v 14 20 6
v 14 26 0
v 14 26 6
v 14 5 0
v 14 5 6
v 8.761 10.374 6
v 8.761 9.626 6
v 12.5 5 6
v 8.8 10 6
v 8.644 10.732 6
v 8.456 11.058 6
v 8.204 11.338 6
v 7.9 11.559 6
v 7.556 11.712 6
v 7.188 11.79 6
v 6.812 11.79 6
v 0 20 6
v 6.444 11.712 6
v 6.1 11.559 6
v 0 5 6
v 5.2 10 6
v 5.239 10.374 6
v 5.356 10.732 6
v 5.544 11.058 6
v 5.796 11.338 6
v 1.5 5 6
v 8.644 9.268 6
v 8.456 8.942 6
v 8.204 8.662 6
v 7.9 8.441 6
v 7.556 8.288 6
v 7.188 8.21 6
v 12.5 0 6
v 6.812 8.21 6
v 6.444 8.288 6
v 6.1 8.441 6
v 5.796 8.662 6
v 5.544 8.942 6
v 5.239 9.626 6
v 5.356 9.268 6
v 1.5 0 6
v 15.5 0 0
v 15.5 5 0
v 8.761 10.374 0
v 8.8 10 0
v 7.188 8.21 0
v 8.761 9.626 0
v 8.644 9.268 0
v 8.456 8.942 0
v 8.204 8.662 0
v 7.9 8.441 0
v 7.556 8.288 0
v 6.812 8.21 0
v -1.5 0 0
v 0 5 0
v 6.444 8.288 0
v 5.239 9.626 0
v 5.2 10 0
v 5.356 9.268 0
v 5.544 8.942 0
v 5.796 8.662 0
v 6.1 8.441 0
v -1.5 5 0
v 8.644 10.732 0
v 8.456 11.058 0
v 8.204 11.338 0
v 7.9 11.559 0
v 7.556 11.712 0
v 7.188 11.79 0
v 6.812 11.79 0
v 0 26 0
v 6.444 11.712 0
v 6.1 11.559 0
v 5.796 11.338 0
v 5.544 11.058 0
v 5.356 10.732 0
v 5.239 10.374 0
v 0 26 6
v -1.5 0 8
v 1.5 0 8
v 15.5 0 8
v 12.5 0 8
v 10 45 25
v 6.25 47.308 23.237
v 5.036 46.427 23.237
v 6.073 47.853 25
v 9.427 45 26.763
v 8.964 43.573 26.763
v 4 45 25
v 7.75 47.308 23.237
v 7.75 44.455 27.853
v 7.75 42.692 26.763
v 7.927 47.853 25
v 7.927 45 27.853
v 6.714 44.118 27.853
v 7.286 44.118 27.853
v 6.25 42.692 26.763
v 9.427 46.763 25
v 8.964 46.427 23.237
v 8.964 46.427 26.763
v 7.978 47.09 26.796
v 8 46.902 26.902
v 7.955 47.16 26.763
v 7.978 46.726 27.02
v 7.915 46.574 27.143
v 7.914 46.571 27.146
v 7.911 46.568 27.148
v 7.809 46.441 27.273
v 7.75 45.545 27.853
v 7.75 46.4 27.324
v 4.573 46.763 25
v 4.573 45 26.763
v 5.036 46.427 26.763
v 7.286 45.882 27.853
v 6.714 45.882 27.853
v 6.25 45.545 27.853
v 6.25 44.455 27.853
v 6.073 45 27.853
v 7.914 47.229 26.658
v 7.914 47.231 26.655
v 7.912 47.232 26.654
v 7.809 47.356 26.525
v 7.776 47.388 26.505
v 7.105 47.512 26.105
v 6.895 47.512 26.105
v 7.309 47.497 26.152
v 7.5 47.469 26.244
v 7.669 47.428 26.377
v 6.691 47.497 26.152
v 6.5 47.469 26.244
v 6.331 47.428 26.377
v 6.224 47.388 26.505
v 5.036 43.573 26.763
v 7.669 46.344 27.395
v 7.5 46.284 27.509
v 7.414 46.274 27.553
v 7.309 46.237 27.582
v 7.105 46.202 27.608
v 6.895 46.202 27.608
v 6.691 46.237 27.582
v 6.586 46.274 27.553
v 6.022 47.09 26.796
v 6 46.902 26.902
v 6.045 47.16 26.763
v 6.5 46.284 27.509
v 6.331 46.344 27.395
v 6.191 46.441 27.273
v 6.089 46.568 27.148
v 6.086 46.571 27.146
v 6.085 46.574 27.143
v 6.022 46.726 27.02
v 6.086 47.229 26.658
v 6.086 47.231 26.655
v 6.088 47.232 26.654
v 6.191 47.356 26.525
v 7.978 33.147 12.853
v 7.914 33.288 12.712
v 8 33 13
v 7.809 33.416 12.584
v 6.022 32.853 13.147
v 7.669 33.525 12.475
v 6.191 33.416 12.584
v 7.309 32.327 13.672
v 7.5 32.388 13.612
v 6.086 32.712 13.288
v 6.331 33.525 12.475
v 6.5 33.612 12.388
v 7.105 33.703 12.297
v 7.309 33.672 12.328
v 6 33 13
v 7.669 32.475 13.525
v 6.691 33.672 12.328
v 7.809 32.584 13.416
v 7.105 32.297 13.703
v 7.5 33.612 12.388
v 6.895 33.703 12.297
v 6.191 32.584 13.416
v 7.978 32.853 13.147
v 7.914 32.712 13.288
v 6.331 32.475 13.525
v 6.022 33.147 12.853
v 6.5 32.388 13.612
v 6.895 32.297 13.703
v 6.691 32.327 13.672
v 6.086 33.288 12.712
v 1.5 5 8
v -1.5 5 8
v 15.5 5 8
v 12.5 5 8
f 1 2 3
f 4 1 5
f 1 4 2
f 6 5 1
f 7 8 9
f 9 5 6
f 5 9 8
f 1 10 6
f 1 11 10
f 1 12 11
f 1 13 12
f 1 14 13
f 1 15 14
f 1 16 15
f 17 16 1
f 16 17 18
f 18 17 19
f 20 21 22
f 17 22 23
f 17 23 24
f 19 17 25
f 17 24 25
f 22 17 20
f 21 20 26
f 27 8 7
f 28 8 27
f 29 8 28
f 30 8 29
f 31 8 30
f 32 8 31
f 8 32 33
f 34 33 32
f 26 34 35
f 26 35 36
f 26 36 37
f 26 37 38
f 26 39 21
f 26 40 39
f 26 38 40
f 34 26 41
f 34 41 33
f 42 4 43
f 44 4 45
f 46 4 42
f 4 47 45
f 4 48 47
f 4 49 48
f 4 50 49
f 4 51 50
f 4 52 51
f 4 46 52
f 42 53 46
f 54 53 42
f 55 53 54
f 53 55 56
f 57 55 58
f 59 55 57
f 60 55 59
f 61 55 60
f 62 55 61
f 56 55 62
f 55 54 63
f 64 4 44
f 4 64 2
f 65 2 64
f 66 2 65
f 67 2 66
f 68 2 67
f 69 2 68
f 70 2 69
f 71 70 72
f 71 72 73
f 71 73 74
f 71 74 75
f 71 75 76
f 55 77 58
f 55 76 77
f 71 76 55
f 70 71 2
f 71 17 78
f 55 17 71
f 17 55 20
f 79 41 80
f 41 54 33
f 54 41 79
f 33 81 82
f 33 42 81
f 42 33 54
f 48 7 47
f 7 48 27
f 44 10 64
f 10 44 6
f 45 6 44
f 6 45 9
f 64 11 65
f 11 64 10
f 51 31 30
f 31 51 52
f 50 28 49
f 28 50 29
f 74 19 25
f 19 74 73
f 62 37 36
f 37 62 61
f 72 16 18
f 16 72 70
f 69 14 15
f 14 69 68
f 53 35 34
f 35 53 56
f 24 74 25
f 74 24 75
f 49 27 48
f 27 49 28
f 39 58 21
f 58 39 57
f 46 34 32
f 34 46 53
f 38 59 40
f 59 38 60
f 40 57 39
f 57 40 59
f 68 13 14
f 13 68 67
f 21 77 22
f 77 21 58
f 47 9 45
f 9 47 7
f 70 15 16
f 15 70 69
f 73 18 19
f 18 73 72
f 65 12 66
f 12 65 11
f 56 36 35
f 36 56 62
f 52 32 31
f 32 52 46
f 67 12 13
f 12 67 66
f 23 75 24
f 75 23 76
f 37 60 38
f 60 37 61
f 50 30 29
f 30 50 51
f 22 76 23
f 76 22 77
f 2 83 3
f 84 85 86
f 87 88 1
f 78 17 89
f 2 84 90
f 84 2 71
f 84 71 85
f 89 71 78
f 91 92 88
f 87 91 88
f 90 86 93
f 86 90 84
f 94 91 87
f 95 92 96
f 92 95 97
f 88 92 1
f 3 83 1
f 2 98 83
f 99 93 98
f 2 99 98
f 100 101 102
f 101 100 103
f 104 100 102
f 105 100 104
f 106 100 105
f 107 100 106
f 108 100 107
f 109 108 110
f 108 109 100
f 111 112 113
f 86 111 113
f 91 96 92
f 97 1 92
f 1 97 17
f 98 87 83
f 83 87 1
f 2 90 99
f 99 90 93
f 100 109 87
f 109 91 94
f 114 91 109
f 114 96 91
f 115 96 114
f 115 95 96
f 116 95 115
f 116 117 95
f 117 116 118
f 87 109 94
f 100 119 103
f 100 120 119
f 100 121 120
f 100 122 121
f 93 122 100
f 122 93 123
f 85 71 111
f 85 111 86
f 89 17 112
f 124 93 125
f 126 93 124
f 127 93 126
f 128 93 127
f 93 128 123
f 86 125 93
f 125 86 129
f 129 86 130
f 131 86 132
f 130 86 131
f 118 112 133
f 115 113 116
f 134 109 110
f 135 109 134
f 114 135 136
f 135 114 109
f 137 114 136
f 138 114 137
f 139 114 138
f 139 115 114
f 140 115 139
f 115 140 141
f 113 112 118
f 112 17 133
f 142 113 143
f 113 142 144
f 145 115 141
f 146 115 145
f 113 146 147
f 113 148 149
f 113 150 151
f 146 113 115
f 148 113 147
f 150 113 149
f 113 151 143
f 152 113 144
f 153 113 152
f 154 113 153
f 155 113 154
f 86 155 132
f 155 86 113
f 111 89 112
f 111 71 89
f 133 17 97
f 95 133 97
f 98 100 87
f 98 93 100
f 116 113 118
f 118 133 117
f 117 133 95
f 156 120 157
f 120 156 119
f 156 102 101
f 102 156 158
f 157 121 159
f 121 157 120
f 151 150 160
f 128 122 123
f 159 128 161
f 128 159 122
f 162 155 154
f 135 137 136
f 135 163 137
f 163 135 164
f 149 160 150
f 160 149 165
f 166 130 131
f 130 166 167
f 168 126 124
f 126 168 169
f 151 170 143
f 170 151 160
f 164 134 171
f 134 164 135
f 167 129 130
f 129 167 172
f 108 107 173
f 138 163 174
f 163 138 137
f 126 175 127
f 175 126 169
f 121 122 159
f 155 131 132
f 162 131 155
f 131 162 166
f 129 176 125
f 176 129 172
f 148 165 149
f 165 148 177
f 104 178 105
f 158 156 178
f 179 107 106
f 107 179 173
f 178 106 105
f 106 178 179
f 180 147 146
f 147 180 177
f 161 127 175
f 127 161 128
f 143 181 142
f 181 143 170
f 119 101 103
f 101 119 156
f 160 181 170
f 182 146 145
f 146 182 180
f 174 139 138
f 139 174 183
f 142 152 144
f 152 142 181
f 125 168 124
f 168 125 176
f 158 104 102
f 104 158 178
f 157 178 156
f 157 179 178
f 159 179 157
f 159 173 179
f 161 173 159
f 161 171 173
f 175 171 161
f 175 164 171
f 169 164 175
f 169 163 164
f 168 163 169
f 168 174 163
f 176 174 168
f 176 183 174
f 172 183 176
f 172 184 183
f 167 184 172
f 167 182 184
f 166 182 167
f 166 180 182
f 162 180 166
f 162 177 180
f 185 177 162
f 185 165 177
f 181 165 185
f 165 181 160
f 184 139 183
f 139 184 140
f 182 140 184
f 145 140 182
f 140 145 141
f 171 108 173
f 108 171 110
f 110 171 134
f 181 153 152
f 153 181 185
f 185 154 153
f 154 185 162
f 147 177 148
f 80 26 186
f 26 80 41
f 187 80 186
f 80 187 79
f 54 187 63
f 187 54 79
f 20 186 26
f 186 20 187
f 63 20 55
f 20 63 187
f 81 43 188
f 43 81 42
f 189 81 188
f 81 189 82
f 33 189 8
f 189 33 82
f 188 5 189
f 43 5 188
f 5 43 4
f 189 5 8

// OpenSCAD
// 20 - 55  (angle)
module needle(){
    module s()
        cylinder(h=6.5,r=1.8,center=true,$fn=30);
    
    
    translate([-1.5,0,0])
        cube([3,5,8]);
    translate([12.5,0,0])
        cube([3,5,8]);
    difference(){
        cube([14,25,6]);
        translate([7,10,3])
            s();
    }
    difference(){
        hull(){
            translate([0,20,0])
                cube([14,6,6]);
            translate([7,45,25])
                sphere(3);
        }
        translate([7,33,13])
            rotate([-45,0,0])
                cylinder(h=20,r=1,$fn=30);
    }
    
}

needle();
